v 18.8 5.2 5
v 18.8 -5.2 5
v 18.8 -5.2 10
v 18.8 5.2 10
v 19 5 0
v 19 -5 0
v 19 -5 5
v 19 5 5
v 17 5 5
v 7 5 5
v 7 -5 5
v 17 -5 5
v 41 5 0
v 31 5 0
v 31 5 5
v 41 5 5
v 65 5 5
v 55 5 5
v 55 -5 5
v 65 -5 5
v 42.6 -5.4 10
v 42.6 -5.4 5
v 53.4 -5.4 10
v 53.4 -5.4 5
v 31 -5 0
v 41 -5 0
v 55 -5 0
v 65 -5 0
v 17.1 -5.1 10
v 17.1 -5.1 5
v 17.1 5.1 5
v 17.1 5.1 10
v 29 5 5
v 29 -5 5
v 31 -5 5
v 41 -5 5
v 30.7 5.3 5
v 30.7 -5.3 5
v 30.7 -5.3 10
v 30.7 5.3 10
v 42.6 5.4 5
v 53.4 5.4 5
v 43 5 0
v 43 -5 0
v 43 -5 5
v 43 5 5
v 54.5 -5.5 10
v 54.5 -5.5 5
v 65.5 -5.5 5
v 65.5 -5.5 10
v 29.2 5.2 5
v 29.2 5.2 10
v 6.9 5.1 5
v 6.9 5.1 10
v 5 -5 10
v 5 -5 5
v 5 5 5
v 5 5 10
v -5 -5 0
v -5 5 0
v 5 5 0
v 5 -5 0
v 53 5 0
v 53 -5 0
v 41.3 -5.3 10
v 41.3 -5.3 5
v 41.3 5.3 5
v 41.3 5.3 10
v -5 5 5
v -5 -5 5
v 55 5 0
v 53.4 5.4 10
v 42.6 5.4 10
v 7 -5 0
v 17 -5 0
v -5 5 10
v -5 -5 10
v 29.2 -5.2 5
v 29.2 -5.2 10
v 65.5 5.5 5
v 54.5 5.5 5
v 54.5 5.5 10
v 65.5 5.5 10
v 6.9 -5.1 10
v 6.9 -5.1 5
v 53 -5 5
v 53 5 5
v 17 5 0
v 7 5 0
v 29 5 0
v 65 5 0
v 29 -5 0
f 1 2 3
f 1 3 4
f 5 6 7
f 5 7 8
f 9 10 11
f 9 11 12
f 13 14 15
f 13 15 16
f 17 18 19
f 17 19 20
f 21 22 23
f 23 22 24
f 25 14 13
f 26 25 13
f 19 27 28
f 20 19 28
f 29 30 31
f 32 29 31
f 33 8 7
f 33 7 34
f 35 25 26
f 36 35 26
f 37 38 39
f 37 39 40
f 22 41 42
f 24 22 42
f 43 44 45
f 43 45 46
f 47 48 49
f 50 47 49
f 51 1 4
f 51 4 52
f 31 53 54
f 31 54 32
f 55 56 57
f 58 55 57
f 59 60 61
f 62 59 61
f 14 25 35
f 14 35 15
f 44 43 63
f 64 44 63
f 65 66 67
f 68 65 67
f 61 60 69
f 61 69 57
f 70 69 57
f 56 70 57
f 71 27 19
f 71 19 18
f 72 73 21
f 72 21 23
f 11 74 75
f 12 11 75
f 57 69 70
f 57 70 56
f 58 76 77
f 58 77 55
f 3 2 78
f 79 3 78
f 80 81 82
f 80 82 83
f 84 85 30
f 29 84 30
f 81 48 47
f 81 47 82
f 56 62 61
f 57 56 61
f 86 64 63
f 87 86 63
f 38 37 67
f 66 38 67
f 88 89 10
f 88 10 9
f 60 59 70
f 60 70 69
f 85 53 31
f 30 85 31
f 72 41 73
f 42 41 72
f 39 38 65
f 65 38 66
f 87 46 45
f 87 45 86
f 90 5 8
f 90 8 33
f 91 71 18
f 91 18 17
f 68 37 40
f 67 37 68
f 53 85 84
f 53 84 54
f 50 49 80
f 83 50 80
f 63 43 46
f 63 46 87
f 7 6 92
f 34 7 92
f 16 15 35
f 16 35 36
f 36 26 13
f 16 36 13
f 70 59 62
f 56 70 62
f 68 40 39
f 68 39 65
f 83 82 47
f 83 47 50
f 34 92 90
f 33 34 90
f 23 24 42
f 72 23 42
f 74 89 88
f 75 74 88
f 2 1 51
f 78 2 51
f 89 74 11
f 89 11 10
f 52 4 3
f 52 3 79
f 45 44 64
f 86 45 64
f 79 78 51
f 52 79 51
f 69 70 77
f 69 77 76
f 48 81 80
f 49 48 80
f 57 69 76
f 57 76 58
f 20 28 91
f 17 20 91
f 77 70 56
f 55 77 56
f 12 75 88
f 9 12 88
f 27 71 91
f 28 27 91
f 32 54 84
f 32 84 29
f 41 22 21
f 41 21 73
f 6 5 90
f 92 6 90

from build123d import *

# Parameters (mm, degrees)
SKETCH1_W             = 10
SKETCH1_H             = 10
BOSS_EXTRUDE1_DEPTH   = 5
BOSS_EXTRUDE1_2_DEPTH = 5
BOSS_EXTRUDE1_3_DEPTH = 5
BOSS_EXTRUDE1_4_DEPTH = 5
BOSS_EXTRUDE1_5_DEPTH = 5
BOSS_EXTRUDE1_6_DEPTH = 5
SKETCH2_W             = 10
SKETCH2_H             = 10
BOSS_EXTRUDE2_DEPTH   = 5
SKETCH2_W_2           = 10.2
SKETCH2_H_2           = 10.2
BOSS_EXTRUDE2_2_DEPTH = 5
SKETCH2_W_3           = 10.4
SKETCH2_H_3           = 10.4
BOSS_EXTRUDE2_3_DEPTH = 5
SKETCH2_W_4           = 10.6
SKETCH2_H_4           = 10.6
BOSS_EXTRUDE2_4_DEPTH = 5
SKETCH2_W_5           = 10.8
SKETCH2_H_5           = 10.8
BOSS_EXTRUDE2_5_DEPTH = 5
SKETCH2_W_6           = 11
SKETCH2_H_6           = 11
BOSS_EXTRUDE2_6_DEPTH = 5


with BuildPart() as part:
    # Sketch1 → Boss-Extrude1 (new body)
    with BuildSketch(Plane.XY):
        Rectangle(SKETCH1_W, SKETCH1_H)
    extrude(amount=BOSS_EXTRUDE1_DEPTH)


with BuildPart() as body_2:
    # Sketch1 → Boss-Extrude1 2 (new body)
    with BuildSketch(Plane.XY):
        with Locations((12, 0)):
            Rectangle(SKETCH1_W, SKETCH1_H)
    extrude(amount=BOSS_EXTRUDE1_2_DEPTH)


with BuildPart() as body_3:
    # Sketch1 → Boss-Extrude1 3 (new body)
    with BuildSketch(Plane.XY):
        with Locations((24, 0)):
            Rectangle(SKETCH1_W, SKETCH1_H)
    extrude(amount=BOSS_EXTRUDE1_3_DEPTH)


with BuildPart() as body_4:
    # Sketch1 → Boss-Extrude1 4 (new body)
    with BuildSketch(Plane.XY):
        with Locations((36, 0)):
            Rectangle(SKETCH1_W, SKETCH1_H)
    extrude(amount=BOSS_EXTRUDE1_4_DEPTH)


with BuildPart() as body_5:
    # Sketch1 → Boss-Extrude1 5 (new body)
    with BuildSketch(Plane.XY):
        with Locations((48, 0)):
            Rectangle(SKETCH1_W, SKETCH1_H)
    extrude(amount=BOSS_EXTRUDE1_5_DEPTH)


with BuildPart() as body_6:
    # Sketch1 → Boss-Extrude1 6 (new body)
    with BuildSketch(Plane.XY):
        with Locations((60, 0)):
            Rectangle(SKETCH1_W, SKETCH1_H)
    extrude(amount=BOSS_EXTRUDE1_6_DEPTH)


with BuildPart() as body_7:
    # Sketch2 → Boss-Extrude2 (new body)
    with BuildSketch(Plane.XY.offset(5)):
        Rectangle(SKETCH2_W, SKETCH2_H)
    extrude(amount=BOSS_EXTRUDE2_DEPTH)


with BuildPart() as body_8:
    # Sketch2 → Boss-Extrude2 2 (new body)
    with BuildSketch(Plane.XY.offset(5)):
        with Locations((12, 0)):
            Rectangle(SKETCH2_W_2, SKETCH2_H_2)
    extrude(amount=BOSS_EXTRUDE2_2_DEPTH)


with BuildPart() as body_9:
    # Sketch2 → Boss-Extrude2 3 (new body)
    with BuildSketch(Plane.XY.offset(5)):
        with Locations((24, 0)):
            Rectangle(SKETCH2_W_3, SKETCH2_H_3)
    extrude(amount=BOSS_EXTRUDE2_3_DEPTH)


with BuildPart() as body_10:
    # Sketch2 → Boss-Extrude2 4 (new body)
    with BuildSketch(Plane.XY.offset(5)):
        with Locations((36, 0)):
            Rectangle(SKETCH2_W_4, SKETCH2_H_4)
    extrude(amount=BOSS_EXTRUDE2_4_DEPTH)


with BuildPart() as body_11:
    # Sketch2 → Boss-Extrude2 5 (new body)
    with BuildSketch(Plane.XY.offset(5)):
        with Locations((48, 0)):
            Rectangle(SKETCH2_W_5, SKETCH2_H_5)
    extrude(amount=BOSS_EXTRUDE2_5_DEPTH)


with BuildPart() as body_12:
    # Sketch2 → Boss-Extrude2 6 (new body)
    with BuildSketch(Plane.XY.offset(5)):
        with Locations((60, 0)):
            Rectangle(SKETCH2_W_6, SKETCH2_H_6)
    extrude(amount=BOSS_EXTRUDE2_6_DEPTH)


solid = Compound([part.part, body_2.part, body_3.part, body_4.part, body_5.part, body_6.part, body_7.part, body_8.part, body_9.part, body_10.part, body_11.part, body_12.part])
